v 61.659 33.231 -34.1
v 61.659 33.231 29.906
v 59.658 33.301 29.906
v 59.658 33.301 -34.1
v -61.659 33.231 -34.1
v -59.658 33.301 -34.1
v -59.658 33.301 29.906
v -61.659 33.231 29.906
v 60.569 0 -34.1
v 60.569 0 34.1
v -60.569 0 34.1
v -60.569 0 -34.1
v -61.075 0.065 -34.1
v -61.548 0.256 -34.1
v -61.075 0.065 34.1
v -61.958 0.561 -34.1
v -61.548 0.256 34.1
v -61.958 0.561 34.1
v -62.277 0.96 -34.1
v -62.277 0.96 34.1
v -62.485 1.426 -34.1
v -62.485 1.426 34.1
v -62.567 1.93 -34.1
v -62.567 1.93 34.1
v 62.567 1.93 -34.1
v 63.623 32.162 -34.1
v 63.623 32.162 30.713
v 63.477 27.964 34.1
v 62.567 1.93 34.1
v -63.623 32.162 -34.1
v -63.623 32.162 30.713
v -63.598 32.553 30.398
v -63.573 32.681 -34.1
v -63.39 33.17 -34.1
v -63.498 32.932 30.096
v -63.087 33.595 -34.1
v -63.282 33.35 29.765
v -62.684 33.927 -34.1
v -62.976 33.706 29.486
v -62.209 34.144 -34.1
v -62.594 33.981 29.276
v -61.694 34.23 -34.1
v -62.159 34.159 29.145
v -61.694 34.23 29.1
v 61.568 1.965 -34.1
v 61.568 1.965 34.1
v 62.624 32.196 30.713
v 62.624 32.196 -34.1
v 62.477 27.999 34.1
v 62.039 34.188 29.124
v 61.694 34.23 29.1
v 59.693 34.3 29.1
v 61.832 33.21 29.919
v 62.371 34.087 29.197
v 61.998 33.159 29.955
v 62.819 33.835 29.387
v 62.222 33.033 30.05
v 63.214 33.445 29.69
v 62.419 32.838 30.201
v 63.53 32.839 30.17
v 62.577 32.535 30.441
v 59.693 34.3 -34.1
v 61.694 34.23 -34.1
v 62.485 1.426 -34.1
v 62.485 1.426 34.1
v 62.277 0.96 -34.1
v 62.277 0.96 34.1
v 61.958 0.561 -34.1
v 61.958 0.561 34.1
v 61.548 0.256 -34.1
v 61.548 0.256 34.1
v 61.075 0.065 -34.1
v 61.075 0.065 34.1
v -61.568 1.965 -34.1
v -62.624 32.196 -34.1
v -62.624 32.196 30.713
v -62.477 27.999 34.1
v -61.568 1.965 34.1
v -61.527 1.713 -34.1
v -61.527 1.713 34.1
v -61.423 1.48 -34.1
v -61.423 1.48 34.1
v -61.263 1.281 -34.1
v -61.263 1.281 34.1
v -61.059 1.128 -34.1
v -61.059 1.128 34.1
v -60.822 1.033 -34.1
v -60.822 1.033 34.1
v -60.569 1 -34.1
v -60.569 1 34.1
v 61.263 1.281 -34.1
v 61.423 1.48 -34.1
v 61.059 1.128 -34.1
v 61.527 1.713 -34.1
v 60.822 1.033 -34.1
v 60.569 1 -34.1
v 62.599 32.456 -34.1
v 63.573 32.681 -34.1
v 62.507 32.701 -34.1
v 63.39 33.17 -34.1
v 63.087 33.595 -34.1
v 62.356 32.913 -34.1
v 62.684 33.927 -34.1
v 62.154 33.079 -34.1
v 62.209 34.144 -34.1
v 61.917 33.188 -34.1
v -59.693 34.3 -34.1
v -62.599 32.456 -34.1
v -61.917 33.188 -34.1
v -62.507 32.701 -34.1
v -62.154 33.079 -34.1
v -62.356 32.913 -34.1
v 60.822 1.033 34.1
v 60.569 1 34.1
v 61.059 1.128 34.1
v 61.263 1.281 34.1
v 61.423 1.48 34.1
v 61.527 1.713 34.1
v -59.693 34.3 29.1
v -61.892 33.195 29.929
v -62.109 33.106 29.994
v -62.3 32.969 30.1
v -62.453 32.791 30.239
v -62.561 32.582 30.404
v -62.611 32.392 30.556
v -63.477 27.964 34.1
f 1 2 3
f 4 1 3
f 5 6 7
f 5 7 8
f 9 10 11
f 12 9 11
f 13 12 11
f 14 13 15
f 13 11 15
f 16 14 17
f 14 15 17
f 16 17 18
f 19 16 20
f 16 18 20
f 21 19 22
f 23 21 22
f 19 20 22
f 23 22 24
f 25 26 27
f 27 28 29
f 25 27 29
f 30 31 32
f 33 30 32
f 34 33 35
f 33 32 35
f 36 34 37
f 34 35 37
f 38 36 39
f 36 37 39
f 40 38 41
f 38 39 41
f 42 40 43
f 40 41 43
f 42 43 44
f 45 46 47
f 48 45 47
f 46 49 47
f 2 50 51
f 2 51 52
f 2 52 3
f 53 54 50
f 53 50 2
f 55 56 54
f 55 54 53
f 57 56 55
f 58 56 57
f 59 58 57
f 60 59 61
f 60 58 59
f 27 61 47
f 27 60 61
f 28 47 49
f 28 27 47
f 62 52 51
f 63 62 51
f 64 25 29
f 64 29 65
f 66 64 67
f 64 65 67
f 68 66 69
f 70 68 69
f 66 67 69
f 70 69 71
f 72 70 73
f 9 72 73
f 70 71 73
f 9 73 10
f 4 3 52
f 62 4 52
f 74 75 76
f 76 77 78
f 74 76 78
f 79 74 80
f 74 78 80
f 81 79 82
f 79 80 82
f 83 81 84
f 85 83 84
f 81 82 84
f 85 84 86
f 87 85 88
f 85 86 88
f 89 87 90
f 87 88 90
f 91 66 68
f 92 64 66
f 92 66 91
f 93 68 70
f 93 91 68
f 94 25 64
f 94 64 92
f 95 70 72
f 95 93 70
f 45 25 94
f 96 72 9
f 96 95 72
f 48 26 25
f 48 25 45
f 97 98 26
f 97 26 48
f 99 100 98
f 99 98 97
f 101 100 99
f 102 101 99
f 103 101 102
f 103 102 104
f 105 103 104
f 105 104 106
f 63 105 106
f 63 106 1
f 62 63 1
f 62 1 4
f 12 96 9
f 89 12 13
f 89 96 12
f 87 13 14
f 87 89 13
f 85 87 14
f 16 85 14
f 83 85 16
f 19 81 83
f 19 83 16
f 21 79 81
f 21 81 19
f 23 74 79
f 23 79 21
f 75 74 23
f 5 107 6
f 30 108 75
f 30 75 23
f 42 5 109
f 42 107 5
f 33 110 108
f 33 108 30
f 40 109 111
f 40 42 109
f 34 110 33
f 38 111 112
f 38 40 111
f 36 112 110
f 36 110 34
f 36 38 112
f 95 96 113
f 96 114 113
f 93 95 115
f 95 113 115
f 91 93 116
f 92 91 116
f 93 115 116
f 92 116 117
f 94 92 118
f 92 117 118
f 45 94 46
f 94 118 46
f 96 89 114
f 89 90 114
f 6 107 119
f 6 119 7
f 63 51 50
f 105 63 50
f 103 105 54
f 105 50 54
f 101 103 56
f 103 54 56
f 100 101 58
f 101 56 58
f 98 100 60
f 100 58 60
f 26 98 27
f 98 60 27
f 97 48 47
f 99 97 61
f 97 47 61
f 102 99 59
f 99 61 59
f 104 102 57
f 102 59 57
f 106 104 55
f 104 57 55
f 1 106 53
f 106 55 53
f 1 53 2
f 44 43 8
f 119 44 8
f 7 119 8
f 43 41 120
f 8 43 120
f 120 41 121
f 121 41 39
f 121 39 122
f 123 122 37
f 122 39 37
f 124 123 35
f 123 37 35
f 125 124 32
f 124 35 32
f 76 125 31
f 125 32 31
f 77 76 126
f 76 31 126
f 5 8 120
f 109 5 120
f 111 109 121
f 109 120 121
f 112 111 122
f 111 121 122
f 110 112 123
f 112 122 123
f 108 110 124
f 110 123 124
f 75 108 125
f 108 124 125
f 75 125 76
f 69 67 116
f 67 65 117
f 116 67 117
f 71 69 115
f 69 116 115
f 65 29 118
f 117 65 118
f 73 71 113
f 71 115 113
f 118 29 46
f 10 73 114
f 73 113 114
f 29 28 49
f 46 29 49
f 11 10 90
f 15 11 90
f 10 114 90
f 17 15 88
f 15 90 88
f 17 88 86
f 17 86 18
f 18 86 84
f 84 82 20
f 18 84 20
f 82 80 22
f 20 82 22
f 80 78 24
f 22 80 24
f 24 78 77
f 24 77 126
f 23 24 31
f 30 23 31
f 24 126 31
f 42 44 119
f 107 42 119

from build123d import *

# Parameters (mm, degrees)
BOSS_EXTRUDE1_DEPTH = 34.1
CUT_EXTRUDE1_DEPTH  = 7


with BuildPart() as part:
    # Sketch1 → Boss-Extrude1 (new body, symmetric)
    with BuildSketch(Plane.XY):
        with BuildLine():
            Line((0, 0), (-60.568627866, 0))
            ThreePointArc((-60.568627866, 0), (-61.957942591, 0.561318453), (-62.567409324, 1.930195406))
            Line((-62.567409324, 1.930195406), (-63.623195406, 32.161524241))
            ThreePointArc((-63.623195406, 32.161524241), (-63.087125173, 33.595321457), (-61.694218542, 34.230110294))
            Line((-61.694218542, 34.230110294), (-59.693, 34.3))
            Line((-59.693, 34.3), (-59.658097703, 33.300609271))
            Line((-59.658097703, 33.300609271), (-61.659316244, 33.230719565))
            ThreePointArc((-61.659316244, 33.230719565), (-62.35576956, 32.913325146), (-62.623804676, 32.196426538))
            Line((-62.623804676, 32.196426538), (-61.568018595, 1.965097703))
            ThreePointArc((-61.568018595, 1.965097703), (-61.263285228, 1.280659226), (-60.568627866, 1))
            Line((-60.568627866, 1), (0, 1))
            Line((0, 1), (60.568627866, 1))
            ThreePointArc((60.568627866, 1), (61.263285228, 1.280659226), (61.568018595, 1.965097703))
            Line((61.568018595, 1.965097703), (62.623804676, 32.196426538))
            ThreePointArc((62.623804676, 32.196426538), (62.35576956, 32.913325146), (61.659316244, 33.230719565))
            Line((61.659316244, 33.230719565), (59.658097703, 33.300609271))
            Line((59.658097703, 33.300609271), (59.693, 34.3))
            Line((59.693, 34.3), (61.694218542, 34.230110294))
            ThreePointArc((61.694218542, 34.230110294), (63.087125173, 33.595321457), (63.623195406, 32.161524241))
            Line((63.623195406, 32.161524241), (62.567409324, 1.930195406))
            ThreePointArc((62.567409324, 1.930195406), (61.957942591, 0.561318453), (60.568627866, 0))
            Line((60.568627866, 0), (0, 0))
        make_face()
    extrude(amount=BOSS_EXTRUDE1_DEPTH, both=True)

    # Sketch2 → Cut-Extrude1 (cut)
    with BuildSketch(Plane(origin=(62.423864353, -2.180064512, 0), x_dir=(0, 0, -1), z_dir=(0.999390729, -0.034902297, 0))):
        Polygon((-34.1, 36.362524836), (-29.1, 36.362524836), (-34.1, 30.162524836), align=None)
    cut_extrude1 = extrude(amount=-CUT_EXTRUDE1_DEPTH, mode=Mode.SUBTRACT)

    # Mirror1: Cut-Extrude1 across plane
    add(cut_extrude1.mirror(Plane(origin=(0, 0, 0), x_dir=(0, 0, 1), z_dir=(1, 0, 0))), mode=Mode.SUBTRACT)


solid = part.part
